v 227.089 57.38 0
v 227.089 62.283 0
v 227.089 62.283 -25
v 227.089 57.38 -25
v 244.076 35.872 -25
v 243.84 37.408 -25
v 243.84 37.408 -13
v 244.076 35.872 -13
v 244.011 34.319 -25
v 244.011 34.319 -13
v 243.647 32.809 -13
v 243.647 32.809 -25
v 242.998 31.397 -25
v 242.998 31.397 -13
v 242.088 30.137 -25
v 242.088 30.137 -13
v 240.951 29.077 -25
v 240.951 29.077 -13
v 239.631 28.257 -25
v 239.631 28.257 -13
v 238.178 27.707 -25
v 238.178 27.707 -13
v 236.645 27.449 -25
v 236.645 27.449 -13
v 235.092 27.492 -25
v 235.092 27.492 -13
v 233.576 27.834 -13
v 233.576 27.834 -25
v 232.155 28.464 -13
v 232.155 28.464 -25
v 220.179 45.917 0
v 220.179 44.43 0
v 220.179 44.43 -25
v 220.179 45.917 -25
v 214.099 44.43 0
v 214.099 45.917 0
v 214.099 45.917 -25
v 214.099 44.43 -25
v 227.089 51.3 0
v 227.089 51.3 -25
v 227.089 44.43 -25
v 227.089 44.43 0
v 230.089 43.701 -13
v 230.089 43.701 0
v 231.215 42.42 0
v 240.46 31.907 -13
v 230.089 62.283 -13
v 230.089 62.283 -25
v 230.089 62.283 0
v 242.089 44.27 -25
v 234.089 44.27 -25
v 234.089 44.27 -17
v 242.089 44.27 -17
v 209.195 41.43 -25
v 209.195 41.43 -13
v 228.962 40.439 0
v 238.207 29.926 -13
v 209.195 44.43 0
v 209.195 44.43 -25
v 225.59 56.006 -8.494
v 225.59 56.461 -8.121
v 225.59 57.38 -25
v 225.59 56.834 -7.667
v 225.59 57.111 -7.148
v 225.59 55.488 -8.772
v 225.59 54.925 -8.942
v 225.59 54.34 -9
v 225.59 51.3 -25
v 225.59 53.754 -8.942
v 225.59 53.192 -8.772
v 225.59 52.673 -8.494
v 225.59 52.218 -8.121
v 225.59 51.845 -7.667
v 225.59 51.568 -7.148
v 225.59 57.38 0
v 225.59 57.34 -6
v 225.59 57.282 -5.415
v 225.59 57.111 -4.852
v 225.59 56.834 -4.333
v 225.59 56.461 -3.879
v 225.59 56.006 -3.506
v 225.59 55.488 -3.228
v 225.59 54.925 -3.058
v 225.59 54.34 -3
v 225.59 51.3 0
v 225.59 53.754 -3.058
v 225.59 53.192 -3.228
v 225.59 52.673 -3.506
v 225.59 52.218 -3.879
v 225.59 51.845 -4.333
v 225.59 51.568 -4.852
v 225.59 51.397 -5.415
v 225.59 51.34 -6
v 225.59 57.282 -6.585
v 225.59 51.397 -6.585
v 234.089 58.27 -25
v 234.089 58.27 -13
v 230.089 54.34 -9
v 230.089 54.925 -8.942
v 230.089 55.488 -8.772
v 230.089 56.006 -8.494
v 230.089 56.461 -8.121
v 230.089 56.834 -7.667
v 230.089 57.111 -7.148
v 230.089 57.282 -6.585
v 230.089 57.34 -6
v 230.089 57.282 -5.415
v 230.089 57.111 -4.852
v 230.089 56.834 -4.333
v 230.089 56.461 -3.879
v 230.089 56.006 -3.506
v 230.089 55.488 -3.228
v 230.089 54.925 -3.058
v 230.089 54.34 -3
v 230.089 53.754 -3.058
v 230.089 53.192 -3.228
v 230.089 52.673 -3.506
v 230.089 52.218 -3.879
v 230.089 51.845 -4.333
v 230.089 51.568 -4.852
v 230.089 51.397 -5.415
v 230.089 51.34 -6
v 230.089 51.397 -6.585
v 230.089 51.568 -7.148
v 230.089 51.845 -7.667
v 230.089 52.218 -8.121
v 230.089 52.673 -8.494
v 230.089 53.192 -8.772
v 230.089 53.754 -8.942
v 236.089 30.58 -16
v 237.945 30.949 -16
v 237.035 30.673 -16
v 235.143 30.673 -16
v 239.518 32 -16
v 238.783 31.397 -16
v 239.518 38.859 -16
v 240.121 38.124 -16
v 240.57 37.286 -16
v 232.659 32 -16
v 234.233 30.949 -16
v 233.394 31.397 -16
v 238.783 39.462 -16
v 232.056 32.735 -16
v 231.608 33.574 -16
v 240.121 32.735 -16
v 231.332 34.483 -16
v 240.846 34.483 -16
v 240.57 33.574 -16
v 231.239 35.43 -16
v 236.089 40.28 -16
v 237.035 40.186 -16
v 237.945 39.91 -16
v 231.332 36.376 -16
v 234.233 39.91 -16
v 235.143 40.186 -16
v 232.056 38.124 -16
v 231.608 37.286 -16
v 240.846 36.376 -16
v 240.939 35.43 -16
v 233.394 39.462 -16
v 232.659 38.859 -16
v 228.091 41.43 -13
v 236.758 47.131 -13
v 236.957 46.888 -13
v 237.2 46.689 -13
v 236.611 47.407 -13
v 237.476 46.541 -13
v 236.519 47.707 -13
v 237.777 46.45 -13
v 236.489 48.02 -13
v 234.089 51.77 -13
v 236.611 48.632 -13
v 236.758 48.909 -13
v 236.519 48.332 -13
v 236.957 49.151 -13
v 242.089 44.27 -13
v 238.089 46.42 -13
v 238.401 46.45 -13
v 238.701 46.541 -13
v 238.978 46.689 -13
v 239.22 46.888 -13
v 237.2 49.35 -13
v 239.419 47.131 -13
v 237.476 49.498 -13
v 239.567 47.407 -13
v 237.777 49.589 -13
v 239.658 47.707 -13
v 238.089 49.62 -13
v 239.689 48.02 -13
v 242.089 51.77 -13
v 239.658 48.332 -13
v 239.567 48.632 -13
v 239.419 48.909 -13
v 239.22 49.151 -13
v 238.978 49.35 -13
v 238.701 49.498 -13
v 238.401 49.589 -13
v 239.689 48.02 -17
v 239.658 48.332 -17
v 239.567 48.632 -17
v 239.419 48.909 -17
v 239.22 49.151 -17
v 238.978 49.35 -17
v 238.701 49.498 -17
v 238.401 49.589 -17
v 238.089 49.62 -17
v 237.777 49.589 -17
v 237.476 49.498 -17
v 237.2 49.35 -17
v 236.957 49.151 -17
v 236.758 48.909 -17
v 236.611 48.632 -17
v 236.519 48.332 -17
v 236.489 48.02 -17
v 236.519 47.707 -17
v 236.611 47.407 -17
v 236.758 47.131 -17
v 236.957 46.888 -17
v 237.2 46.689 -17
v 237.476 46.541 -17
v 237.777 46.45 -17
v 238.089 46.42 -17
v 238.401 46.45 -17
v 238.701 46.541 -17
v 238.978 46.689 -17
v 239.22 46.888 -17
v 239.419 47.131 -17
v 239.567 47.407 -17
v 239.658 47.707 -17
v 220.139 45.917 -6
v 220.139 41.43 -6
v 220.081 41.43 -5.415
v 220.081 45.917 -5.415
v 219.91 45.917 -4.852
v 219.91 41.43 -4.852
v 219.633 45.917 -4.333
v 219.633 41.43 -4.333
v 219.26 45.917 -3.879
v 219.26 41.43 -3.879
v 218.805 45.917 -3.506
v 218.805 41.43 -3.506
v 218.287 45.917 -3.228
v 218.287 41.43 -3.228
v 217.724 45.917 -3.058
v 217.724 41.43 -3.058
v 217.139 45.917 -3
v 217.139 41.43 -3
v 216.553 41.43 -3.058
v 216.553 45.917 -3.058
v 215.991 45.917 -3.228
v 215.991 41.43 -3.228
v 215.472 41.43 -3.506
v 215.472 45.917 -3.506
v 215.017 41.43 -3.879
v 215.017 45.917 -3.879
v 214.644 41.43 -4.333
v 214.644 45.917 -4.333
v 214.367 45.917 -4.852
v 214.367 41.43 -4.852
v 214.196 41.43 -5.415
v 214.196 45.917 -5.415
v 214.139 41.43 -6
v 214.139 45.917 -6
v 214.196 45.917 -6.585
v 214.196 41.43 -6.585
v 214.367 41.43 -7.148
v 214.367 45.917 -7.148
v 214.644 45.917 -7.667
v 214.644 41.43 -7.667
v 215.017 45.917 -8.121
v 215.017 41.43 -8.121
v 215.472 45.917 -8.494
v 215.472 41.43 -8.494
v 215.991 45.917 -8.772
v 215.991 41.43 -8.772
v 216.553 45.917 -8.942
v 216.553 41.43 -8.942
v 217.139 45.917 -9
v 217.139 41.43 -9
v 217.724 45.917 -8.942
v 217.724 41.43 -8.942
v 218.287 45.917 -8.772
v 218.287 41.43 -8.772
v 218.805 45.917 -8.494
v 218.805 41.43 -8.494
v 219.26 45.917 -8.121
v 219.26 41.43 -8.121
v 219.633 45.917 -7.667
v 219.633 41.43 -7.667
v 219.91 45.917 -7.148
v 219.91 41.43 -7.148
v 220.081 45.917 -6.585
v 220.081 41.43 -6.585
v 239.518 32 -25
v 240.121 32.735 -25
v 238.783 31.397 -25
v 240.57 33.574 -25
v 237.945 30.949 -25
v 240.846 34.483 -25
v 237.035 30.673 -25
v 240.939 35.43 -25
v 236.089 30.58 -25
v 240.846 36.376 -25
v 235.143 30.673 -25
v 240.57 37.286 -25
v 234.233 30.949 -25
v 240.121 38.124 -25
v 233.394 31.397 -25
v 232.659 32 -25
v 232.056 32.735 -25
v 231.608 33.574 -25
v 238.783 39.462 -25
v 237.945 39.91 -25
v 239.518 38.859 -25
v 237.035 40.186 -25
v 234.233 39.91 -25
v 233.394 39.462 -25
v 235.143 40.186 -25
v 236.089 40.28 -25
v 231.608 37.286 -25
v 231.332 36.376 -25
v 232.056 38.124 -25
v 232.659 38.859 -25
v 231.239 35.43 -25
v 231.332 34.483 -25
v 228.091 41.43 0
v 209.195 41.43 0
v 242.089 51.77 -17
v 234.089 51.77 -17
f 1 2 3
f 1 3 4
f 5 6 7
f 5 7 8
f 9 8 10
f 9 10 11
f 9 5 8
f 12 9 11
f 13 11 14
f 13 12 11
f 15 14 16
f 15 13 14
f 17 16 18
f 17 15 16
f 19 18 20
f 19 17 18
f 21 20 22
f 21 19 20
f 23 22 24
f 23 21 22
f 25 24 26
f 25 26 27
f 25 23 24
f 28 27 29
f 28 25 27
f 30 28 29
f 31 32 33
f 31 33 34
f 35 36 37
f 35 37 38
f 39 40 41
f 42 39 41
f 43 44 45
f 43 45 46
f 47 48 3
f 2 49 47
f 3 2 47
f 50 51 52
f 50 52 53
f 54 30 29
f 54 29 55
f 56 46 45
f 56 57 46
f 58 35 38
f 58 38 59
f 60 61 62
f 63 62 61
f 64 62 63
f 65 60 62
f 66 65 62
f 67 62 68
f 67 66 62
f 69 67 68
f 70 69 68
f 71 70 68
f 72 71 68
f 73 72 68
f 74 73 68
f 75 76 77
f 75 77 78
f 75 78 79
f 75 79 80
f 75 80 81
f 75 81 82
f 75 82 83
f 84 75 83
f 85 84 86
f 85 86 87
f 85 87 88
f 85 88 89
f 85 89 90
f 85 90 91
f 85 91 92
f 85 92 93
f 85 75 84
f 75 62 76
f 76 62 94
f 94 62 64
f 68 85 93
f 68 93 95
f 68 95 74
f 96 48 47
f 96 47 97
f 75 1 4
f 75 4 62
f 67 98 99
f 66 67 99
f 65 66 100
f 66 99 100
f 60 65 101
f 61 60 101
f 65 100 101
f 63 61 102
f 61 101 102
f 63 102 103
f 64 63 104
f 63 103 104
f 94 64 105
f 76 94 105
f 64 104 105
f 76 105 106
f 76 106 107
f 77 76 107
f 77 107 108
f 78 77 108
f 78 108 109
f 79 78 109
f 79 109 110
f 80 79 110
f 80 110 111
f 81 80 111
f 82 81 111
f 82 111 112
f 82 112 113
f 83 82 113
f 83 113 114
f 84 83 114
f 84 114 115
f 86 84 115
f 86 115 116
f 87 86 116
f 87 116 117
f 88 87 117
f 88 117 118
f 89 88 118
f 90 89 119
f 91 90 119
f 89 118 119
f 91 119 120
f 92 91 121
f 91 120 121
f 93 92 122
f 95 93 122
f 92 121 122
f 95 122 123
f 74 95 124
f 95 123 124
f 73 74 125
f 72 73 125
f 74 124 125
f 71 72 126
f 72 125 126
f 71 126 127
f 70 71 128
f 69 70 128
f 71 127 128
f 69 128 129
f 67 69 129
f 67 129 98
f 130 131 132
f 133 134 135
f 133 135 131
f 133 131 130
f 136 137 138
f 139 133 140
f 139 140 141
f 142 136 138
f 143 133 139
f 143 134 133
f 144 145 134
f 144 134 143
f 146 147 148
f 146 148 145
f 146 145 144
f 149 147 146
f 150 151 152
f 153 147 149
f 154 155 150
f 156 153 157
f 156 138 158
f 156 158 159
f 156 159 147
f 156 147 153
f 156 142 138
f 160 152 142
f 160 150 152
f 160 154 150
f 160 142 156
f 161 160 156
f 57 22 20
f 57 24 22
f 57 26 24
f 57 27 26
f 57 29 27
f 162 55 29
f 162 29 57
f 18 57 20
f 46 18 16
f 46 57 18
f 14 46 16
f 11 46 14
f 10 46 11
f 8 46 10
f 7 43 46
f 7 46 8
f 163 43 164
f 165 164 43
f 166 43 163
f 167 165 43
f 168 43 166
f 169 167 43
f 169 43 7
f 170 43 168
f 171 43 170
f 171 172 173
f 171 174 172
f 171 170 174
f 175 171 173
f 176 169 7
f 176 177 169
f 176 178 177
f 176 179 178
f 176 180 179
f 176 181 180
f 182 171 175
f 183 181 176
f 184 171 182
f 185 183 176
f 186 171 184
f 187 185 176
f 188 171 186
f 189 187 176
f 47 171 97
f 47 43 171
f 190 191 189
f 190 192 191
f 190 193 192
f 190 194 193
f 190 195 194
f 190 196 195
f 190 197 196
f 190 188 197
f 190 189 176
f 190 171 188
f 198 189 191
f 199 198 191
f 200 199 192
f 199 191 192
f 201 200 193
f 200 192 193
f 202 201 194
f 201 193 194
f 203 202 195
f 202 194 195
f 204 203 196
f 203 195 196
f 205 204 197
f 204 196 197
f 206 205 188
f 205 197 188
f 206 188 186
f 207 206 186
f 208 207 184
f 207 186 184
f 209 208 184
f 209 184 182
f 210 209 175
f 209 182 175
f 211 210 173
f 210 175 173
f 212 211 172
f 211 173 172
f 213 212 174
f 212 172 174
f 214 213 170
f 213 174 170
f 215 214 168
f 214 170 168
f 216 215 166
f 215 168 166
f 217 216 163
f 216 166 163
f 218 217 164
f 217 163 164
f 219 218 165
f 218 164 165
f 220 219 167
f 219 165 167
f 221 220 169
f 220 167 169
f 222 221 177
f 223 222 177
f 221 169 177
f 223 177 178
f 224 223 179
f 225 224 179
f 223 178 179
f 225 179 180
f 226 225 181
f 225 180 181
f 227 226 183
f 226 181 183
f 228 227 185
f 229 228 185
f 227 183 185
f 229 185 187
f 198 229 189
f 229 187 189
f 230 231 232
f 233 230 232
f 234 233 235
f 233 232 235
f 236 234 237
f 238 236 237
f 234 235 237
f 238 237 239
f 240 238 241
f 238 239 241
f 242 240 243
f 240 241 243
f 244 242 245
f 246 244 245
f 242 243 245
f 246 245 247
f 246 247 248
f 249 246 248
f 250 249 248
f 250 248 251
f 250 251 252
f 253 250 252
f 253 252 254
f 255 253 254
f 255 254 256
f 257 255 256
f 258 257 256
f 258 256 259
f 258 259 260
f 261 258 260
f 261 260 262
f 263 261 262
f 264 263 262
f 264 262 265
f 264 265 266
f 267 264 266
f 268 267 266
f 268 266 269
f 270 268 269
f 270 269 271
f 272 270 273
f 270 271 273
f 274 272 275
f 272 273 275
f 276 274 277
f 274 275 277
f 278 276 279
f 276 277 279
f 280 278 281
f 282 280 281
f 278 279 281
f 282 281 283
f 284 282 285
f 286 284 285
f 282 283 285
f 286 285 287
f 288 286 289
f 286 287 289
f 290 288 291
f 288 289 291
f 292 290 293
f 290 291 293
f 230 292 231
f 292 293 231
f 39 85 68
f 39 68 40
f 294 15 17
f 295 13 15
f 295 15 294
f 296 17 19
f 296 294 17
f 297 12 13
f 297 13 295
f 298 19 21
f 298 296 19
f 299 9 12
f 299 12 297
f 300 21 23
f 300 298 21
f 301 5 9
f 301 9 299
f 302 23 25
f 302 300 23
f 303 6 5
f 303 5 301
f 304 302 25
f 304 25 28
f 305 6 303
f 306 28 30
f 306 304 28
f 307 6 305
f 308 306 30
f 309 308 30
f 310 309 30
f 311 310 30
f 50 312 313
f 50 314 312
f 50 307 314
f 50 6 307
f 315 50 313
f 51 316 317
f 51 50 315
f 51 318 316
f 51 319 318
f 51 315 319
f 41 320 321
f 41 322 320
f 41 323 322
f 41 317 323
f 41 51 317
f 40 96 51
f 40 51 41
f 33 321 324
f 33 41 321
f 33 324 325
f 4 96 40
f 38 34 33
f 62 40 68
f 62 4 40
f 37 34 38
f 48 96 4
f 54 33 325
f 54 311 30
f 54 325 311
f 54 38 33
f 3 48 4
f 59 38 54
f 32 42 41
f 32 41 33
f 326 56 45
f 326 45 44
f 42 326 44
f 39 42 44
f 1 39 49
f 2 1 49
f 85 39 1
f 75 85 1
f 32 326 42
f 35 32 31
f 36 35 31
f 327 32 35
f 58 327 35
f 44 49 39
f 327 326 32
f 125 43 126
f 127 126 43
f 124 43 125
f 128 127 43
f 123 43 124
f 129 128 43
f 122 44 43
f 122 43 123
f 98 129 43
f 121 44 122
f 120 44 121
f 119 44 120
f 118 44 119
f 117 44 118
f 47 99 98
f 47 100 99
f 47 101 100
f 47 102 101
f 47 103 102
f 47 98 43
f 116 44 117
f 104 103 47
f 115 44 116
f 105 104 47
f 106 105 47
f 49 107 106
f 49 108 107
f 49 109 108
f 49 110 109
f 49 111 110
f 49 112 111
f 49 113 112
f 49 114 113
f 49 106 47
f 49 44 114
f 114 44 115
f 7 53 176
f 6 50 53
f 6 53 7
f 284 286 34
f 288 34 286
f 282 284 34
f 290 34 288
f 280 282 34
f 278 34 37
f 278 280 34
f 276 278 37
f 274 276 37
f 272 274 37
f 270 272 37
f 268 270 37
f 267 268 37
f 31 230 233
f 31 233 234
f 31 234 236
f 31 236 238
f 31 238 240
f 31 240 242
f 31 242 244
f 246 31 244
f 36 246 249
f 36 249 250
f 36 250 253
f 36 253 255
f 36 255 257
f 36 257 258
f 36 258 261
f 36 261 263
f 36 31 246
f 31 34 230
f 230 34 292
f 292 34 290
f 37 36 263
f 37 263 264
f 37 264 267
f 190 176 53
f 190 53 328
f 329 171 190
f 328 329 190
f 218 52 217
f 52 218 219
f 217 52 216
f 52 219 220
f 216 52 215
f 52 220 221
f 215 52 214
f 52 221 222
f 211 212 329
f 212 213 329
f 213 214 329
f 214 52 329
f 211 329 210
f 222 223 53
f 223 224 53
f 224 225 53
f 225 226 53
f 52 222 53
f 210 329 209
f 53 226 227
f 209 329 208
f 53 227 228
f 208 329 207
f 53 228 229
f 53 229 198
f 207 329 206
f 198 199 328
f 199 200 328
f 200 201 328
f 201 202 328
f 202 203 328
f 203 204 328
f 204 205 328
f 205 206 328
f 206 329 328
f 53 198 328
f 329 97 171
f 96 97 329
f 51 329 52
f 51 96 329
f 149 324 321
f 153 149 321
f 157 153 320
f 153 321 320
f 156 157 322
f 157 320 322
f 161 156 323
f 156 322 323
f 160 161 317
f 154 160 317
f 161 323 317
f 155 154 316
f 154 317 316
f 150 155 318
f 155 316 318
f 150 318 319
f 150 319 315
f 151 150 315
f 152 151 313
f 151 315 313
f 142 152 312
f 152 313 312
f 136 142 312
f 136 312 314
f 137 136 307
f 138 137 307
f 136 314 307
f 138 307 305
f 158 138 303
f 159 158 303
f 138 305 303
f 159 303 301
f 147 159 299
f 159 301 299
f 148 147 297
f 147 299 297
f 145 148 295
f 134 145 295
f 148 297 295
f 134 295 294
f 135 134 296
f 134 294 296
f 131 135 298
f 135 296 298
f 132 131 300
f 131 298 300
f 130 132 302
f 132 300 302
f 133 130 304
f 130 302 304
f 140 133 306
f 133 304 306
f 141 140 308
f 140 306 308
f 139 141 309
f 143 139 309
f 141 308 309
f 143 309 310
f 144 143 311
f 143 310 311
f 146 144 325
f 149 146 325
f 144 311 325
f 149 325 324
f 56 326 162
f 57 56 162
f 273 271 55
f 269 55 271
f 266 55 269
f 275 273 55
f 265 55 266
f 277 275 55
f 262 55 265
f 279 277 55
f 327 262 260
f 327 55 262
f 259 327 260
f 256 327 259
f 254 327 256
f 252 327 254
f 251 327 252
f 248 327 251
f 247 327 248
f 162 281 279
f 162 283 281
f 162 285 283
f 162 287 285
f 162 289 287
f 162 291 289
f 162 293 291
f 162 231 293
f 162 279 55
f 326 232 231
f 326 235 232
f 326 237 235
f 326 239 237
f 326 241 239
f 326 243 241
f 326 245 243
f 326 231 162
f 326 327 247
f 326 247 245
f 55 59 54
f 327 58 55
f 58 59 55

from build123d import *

# Parameters (mm, degrees)
BOSS_EXTRUDE1_DEPTH = 25
SKETCH2_R           = 3
CUT_EXTRUDE1_DEPTH  = 15
SKETCH3_R           = 3
CUT_EXTRUDE2_DEPTH  = 15
BOSS_EXTRUDE2_DEPTH = 12
BOSS_EXTRUDE4_DEPTH = 1.5
SKETCH6_R           = 4.85
CUT_EXTRUDE3_DEPTH  = 9
SKETCH7_W           = 8
SKETCH7_H           = 7.5
BOSS_EXTRUDE5_DEPTH = 4
SKETCH8_R           = 1.6
CUT_EXTRUDE4_DEPTH  = 4


with BuildPart() as part:
    # Sketch1 → Boss-Extrude1 (new body)
    with BuildSketch(Plane.XY):
        Polygon((227.088719843, 62.282971172), (227.088719843, 57.379571172), (225.590119843, 57.379571172), (225.590119843, 51.299571172), (227.088719843, 51.299571172), (227.088719843, 44.429550862), (220.178702595, 44.429550862), (220.178702595, 45.917195068), (214.098687419, 45.917195068), (214.098687419, 44.429550862), (209.19527518, 44.429550862), (209.19527518, 41.429550862), (230.088719843, 41.429550862), (230.088719843, 62.282971172), align=None)
    extrude(amount=-BOSS_EXTRUDE1_DEPTH)

    # Sketch2 → Cut-Extrude1 (cut)
    with BuildSketch(Plane(origin=(230.088719843, 0, 0), x_dir=(0, 0, -1), z_dir=(1, 0, 0))):
        with Locations((6, 54.339571172)):
            Circle(SKETCH2_R)
    extrude(amount=-CUT_EXTRUDE1_DEPTH, mode=Mode.SUBTRACT)

    # Sketch3 → Cut-Extrude2 (cut)
    with BuildSketch(Plane.XZ.offset(-41.429550862)):
        with Locations((217.138695007, -6)):
            Circle(SKETCH3_R)
    extrude(amount=-CUT_EXTRUDE2_DEPTH, mode=Mode.SUBTRACT)

    # Sketch4 → Boss-Extrude2 (add)
    with BuildSketch(Plane(origin=(0, 0, -25), x_dir=(-1, 0, 0), z_dir=(0, 0, -1))):
        with BuildLine():
            Line((-230.088719843, 62.282971172), (-234.088719843, 58.269609721))
            Line((-234.088719843, 58.269609721), (-234.088719843, 44.269609721))
            Line((-234.088719843, 44.269609721), (-242.088719843, 44.269609721))
            Line((-242.088719843, 44.269609721), (-243.840170155, 37.408191323))
            ThreePointArc((-243.840170155, 37.408191323), (-240.951322195, 29.07698458), (-232.154834185, 28.463594817))
            Line((-232.154834185, 28.463594817), (-209.19527518, 41.429550862))
            Line((-209.19527518, 41.429550862), (-230.088719843, 41.429550862))
            Line((-230.088719843, 41.429550862), (-230.088719843, 62.282971172))
        make_face()
    extrude(amount=-BOSS_EXTRUDE2_DEPTH)

    # Sketch5 → Boss-Extrude4 (add, symmetric)
    with BuildSketch(Plane(origin=(150.295838672, 132.167186427, 0), x_dir=(0.660365554, -0.750944296, 0), z_dir=(-0.750944296, -0.660365554, 0))):
        Polygon((120.831380003, -13), (134.831380003, -13), (120.831380003, 0), (116.597450455, 0), (116.597450455, -13), align=None)
    extrude(amount=BOSS_EXTRUDE4_DEPTH, both=True)

    # Sketch6 → Cut-Extrude3 (cut)
    with BuildSketch(Plane(origin=(0, 0, -25), x_dir=(-1, 0, 0), z_dir=(0, 0, -1))):
        with Locations((-236.088719843, 35.429550862)):
            Circle(SKETCH6_R)
    extrude(amount=-CUT_EXTRUDE3_DEPTH, mode=Mode.SUBTRACT)

    # Sketch7 → Boss-Extrude5 (add)
    with BuildSketch(Plane.XY.offset(-13)):
        with Locations((238.088719843, 48.019609721)):
            Rectangle(SKETCH7_W, SKETCH7_H)
    extrude(amount=-BOSS_EXTRUDE5_DEPTH)

    # Sketch8 → Cut-Extrude4 (cut)
    with BuildSketch(Plane.XY.offset(-13)):
        with Locations((238.088719843, 48.019609721)):
            Circle(SKETCH8_R)
    extrude(amount=-CUT_EXTRUDE4_DEPTH, mode=Mode.SUBTRACT)


solid = part.part
